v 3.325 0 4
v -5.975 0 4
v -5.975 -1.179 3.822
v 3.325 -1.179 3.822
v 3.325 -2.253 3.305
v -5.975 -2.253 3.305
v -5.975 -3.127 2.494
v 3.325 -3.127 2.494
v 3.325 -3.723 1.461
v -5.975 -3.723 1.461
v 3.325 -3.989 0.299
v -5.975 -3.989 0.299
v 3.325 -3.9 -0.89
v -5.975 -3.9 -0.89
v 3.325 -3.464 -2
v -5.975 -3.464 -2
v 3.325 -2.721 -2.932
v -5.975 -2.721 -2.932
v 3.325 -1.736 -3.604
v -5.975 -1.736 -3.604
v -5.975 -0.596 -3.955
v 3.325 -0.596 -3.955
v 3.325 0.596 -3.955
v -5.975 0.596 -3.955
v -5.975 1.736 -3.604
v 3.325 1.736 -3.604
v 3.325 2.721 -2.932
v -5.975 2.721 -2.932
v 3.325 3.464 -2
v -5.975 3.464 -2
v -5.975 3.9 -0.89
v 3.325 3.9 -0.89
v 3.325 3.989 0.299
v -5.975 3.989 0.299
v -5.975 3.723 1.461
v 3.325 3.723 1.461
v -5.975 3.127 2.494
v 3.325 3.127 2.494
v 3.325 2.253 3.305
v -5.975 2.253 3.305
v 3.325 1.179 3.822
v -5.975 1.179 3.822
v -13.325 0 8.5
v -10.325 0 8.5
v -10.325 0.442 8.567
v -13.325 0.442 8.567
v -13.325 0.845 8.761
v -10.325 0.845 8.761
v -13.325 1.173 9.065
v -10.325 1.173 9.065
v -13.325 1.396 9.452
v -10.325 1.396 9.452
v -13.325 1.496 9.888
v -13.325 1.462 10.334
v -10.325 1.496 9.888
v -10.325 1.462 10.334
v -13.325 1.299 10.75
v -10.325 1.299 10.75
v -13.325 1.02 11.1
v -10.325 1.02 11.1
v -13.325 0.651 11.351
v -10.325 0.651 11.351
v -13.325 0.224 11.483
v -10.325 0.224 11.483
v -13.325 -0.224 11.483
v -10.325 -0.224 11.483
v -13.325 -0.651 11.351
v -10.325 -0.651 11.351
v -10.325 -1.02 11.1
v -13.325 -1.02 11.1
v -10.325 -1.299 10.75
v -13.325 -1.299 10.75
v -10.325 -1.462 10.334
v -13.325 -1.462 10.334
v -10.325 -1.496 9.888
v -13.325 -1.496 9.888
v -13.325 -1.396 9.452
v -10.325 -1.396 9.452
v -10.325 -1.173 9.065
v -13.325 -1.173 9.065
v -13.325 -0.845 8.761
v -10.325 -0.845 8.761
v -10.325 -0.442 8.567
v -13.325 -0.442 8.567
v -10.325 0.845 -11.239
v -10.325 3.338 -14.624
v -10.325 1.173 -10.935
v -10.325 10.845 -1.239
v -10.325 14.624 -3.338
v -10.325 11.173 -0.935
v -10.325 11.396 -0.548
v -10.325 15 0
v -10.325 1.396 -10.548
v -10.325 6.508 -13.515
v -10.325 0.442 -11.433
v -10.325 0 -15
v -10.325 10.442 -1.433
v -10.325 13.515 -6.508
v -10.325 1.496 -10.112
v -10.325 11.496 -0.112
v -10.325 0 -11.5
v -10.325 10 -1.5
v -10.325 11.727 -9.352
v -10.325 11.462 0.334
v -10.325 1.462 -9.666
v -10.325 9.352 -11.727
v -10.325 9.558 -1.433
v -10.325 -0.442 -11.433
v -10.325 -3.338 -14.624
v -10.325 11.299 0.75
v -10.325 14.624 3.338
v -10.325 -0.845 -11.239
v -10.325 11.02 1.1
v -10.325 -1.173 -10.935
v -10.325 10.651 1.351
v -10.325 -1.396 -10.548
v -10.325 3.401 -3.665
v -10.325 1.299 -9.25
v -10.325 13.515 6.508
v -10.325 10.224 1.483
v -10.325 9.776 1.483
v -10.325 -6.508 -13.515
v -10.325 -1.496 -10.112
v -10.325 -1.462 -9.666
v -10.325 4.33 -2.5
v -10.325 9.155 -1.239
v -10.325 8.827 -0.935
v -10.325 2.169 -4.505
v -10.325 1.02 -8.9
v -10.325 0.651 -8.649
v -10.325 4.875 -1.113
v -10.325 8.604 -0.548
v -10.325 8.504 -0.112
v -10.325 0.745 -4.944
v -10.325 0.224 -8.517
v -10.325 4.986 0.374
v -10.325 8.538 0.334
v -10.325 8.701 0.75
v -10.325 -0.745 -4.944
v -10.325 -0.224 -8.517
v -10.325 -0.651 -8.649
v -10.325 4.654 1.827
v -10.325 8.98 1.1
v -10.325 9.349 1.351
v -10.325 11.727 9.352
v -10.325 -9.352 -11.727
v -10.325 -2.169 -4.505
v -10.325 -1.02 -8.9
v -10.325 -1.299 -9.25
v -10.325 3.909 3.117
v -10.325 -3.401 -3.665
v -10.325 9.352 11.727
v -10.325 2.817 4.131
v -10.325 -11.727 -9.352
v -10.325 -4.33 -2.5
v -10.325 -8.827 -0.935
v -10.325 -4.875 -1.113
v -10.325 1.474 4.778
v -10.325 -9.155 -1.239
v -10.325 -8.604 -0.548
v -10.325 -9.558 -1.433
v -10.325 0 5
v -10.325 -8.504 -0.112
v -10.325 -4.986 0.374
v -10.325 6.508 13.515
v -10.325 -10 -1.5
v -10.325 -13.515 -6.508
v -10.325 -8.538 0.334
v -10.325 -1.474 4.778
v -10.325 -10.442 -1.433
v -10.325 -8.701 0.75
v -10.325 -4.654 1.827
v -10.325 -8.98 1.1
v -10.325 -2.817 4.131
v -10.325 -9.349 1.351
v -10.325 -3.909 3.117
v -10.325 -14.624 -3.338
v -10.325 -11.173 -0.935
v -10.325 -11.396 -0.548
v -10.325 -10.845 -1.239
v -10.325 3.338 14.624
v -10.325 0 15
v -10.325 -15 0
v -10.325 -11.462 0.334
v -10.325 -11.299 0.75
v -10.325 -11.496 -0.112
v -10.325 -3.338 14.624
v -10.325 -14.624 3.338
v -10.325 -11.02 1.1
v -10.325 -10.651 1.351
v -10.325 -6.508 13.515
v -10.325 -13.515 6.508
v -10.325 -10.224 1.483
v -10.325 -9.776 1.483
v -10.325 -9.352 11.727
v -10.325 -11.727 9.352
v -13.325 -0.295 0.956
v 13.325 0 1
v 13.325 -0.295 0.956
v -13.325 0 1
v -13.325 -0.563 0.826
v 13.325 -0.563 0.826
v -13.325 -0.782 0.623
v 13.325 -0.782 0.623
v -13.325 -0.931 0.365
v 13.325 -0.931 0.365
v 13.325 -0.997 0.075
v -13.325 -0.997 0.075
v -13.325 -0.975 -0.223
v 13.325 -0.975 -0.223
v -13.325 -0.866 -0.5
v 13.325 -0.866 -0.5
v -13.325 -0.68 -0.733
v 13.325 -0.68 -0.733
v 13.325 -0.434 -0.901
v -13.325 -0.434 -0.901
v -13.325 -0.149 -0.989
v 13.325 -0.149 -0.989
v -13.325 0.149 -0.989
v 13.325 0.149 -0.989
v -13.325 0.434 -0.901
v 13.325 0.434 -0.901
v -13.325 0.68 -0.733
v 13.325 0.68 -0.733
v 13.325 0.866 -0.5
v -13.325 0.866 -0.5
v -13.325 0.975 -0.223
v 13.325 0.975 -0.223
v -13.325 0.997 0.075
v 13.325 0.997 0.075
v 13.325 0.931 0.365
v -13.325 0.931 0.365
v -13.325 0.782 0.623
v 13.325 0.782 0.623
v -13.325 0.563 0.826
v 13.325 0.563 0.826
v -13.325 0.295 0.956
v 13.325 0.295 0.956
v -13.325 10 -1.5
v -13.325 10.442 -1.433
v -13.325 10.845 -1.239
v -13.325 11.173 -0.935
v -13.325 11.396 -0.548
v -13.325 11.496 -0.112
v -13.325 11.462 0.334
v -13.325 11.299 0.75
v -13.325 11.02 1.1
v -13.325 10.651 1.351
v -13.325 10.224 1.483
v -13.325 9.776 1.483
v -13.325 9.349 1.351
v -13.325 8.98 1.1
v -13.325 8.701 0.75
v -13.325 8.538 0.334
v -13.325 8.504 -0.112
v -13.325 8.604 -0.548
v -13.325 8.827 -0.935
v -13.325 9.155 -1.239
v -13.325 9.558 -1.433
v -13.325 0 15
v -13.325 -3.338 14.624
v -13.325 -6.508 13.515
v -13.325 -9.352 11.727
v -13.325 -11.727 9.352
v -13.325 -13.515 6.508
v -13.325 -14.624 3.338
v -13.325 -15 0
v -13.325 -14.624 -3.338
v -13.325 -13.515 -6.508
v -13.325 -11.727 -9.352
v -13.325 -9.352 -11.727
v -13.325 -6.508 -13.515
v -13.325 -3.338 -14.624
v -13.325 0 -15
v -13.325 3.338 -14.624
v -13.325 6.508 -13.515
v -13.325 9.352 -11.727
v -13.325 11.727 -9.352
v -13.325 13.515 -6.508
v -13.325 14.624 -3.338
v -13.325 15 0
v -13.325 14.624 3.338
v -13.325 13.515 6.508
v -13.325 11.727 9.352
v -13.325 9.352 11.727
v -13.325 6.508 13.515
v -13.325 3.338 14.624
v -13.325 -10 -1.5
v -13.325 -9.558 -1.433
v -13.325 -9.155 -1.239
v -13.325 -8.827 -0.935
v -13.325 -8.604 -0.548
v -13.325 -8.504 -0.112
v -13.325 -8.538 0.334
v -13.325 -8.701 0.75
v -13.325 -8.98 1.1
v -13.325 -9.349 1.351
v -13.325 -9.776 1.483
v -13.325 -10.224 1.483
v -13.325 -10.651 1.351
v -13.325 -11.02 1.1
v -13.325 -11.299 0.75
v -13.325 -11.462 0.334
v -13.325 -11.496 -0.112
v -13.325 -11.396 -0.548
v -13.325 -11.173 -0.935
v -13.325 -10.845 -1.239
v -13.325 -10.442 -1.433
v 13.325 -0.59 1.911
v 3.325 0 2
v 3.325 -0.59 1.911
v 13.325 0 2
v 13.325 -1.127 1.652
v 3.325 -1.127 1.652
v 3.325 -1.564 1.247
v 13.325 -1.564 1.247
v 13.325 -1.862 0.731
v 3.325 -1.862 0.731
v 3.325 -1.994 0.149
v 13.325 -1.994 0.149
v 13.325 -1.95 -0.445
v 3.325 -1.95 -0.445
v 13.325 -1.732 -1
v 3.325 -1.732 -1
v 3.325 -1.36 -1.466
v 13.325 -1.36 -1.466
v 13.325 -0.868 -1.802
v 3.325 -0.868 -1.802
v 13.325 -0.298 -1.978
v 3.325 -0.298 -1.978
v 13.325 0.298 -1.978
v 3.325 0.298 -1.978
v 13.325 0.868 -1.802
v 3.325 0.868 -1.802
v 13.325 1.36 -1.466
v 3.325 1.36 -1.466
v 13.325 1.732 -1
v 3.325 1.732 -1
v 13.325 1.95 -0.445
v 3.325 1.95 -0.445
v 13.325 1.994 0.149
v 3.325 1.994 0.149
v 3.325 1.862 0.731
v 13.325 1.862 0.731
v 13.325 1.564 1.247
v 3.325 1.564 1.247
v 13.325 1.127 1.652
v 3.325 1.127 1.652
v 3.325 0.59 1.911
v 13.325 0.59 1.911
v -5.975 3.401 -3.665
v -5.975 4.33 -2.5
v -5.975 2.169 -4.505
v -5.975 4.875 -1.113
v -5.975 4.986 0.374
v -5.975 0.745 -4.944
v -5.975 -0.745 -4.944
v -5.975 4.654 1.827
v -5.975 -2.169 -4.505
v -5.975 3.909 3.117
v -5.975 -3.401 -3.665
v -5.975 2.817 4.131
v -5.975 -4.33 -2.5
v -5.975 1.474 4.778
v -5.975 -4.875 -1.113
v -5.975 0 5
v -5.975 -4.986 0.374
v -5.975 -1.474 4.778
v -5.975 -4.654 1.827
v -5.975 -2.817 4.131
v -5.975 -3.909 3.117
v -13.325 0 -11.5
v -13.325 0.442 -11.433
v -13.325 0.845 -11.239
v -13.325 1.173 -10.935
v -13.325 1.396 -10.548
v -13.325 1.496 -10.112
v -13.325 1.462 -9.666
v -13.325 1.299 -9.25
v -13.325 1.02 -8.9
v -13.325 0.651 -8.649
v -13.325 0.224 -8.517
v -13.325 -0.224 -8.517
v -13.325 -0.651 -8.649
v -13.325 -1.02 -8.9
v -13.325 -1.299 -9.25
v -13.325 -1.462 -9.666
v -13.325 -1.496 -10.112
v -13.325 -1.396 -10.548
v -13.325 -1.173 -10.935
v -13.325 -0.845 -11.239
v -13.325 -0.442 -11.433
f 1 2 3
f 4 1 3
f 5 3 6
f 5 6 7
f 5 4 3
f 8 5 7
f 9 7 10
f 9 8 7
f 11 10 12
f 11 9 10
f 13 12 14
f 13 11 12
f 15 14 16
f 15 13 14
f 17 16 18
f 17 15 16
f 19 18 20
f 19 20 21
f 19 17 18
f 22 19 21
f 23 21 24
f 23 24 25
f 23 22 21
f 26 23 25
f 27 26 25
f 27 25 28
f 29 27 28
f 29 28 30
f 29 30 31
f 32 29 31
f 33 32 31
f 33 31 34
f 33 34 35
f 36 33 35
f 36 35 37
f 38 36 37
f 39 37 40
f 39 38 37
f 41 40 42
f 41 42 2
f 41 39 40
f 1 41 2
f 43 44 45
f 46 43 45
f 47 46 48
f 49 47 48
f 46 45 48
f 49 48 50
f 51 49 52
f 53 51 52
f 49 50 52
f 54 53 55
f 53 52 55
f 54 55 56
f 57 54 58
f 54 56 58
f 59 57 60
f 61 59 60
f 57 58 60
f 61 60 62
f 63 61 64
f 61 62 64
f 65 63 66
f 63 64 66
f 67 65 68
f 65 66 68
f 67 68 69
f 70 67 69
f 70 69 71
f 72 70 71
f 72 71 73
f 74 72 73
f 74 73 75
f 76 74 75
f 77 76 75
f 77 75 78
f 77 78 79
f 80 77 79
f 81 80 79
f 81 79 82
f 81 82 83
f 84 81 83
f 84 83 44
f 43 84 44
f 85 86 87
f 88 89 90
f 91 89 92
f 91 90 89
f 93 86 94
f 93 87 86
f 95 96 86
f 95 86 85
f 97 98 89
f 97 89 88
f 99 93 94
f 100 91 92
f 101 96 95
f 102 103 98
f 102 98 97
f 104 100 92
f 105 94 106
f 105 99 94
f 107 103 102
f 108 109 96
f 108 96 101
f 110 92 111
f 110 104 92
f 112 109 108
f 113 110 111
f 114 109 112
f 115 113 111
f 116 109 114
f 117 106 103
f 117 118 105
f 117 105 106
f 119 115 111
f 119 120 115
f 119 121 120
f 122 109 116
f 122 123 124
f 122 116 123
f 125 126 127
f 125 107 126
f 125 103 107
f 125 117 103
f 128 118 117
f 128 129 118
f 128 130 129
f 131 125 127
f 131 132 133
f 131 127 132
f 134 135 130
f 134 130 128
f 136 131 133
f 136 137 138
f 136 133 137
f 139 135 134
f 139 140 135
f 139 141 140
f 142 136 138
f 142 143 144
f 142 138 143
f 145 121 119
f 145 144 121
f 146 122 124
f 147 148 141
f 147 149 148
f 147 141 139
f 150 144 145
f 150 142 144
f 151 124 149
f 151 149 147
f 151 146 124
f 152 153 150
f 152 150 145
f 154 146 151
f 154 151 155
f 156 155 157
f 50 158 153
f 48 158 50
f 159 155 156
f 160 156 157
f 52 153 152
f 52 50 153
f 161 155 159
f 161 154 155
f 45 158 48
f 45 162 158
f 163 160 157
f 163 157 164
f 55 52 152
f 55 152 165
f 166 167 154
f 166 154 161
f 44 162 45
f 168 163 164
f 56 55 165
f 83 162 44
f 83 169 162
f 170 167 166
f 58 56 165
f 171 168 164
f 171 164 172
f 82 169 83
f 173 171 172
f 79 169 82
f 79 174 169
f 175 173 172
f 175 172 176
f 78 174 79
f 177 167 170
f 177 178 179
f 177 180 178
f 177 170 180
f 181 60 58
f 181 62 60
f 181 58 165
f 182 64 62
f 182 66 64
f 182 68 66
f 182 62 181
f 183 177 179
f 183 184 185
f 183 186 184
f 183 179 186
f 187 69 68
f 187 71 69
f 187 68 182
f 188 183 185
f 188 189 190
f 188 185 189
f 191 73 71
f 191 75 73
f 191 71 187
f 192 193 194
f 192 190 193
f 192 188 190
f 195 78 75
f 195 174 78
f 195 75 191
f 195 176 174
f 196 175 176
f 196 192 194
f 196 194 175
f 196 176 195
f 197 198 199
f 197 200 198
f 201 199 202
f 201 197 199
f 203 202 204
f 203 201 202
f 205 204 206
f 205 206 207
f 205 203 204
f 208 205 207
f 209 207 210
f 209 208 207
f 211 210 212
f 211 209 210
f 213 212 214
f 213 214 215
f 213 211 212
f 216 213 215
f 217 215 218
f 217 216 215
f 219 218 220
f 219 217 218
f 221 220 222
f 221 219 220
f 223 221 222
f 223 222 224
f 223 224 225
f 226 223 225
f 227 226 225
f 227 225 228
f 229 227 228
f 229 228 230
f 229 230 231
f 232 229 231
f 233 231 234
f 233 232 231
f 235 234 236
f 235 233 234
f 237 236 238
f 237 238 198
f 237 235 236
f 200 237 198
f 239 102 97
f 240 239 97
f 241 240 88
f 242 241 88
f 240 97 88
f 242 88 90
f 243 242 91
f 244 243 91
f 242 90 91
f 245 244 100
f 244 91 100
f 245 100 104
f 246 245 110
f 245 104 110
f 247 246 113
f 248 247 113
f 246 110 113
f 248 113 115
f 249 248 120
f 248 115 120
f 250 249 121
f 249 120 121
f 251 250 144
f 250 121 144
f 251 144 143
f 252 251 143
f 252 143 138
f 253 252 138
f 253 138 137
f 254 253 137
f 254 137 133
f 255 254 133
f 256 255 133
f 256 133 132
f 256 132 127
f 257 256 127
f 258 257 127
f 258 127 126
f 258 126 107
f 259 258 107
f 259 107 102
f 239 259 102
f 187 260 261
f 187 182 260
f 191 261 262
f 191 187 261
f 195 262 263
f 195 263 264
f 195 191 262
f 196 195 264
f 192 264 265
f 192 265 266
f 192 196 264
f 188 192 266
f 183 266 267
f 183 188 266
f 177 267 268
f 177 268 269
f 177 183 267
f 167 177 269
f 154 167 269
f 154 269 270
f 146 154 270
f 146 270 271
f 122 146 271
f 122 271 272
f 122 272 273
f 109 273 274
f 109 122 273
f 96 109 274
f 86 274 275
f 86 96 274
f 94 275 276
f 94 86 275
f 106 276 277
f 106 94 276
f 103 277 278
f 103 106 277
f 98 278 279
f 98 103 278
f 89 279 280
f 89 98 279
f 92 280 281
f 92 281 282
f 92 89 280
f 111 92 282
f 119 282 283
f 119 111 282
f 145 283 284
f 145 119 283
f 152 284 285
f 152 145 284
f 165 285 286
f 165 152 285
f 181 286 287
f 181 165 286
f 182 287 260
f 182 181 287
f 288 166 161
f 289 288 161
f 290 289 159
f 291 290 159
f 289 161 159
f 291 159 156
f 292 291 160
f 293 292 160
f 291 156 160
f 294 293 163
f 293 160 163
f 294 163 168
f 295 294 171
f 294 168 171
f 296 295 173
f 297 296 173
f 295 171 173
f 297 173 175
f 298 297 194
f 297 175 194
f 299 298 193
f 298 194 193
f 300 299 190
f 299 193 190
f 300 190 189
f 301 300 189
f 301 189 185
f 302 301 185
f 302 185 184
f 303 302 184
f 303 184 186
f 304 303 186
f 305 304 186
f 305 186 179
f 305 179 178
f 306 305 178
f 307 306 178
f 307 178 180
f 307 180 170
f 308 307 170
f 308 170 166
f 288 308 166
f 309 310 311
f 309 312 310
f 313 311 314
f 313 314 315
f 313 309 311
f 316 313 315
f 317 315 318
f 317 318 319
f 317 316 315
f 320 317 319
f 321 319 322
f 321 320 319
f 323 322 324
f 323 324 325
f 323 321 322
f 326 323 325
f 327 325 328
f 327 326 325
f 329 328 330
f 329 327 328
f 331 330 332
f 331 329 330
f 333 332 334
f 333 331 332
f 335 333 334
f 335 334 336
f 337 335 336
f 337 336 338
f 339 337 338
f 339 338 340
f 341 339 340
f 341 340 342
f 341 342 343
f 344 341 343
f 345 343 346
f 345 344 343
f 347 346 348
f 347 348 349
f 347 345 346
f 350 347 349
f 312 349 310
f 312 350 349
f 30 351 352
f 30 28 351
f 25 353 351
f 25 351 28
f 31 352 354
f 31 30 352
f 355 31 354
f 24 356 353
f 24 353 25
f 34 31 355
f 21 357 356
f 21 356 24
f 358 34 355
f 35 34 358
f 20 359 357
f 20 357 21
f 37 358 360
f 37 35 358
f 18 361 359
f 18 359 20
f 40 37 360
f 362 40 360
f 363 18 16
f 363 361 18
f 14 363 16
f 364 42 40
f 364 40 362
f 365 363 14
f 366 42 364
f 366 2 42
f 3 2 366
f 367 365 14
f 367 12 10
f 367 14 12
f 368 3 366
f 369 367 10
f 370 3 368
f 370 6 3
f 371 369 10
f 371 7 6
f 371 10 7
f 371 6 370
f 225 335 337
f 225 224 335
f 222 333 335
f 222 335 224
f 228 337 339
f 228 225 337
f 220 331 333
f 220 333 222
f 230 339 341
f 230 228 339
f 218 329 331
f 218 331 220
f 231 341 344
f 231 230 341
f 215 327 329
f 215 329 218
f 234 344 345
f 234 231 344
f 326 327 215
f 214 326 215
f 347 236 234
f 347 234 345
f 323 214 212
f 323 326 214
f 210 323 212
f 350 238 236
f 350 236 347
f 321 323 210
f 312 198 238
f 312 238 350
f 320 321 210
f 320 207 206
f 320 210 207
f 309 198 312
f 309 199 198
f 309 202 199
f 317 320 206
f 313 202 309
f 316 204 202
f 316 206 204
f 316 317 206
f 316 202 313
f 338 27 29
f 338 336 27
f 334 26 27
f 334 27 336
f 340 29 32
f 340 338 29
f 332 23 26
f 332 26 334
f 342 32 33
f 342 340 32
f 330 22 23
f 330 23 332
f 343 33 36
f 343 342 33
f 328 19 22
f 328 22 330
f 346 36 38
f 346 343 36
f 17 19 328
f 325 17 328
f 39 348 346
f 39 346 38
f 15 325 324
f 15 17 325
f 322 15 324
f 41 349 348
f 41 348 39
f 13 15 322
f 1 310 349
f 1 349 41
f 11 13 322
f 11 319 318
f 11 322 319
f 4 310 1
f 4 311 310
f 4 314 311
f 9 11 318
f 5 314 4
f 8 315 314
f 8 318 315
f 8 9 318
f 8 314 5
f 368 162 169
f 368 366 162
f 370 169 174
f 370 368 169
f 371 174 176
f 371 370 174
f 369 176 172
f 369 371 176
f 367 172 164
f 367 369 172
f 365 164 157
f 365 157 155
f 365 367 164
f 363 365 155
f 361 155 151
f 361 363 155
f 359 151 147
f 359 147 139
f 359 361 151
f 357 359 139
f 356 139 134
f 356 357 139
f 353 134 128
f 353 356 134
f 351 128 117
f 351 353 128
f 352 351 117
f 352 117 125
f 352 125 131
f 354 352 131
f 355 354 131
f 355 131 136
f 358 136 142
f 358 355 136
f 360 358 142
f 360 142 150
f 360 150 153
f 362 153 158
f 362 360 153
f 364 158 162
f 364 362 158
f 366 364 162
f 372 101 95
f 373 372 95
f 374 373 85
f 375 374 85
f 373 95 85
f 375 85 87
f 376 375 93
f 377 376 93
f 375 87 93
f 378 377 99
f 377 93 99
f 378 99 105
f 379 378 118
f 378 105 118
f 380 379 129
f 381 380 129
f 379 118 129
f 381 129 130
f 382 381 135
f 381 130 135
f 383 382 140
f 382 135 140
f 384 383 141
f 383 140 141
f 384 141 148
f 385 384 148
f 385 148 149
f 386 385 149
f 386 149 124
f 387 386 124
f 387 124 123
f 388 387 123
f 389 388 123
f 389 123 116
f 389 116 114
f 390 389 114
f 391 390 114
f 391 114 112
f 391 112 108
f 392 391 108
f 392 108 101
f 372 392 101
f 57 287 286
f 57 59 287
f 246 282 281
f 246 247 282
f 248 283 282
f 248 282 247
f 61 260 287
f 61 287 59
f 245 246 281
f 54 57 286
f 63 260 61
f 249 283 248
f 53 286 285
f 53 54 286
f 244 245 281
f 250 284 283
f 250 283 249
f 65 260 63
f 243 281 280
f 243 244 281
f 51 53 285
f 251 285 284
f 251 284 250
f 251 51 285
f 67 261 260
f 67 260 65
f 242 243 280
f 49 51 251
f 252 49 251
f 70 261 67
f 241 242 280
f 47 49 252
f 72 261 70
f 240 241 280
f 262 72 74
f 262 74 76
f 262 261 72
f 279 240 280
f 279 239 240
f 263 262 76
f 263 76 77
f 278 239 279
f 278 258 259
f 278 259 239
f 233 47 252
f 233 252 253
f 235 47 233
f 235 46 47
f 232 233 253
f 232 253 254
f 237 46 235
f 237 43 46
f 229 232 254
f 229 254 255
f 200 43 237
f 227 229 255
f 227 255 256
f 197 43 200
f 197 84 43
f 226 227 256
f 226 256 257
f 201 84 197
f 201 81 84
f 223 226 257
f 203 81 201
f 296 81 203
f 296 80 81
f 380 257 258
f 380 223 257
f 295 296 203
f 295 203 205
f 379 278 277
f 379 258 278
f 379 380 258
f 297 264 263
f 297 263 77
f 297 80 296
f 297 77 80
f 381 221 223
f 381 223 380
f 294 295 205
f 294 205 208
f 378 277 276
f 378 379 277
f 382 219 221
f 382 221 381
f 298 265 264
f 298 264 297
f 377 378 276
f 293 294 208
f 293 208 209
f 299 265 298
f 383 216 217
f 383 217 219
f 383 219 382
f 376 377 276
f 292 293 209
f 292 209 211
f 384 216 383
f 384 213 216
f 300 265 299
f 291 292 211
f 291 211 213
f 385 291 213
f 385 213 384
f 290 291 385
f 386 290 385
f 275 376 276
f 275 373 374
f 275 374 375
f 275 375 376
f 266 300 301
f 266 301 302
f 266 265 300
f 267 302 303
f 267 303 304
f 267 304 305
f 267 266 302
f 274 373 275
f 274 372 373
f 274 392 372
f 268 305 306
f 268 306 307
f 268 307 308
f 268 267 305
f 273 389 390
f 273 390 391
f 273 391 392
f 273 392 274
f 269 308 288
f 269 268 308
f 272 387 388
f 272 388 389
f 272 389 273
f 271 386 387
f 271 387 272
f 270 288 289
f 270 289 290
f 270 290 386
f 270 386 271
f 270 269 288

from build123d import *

# Parameters (mm, degrees)
SKETCH2_R          = 1.5
CUT_EXTRUDE1_DEPTH = 32.769836323


with BuildPart() as part:
    # Sketch1 → Revolve1 (revolve)
    with BuildSketch(Plane.XY, mode=Mode.PRIVATE) as revolve1_sk:
        Polygon((-13.325, 1), (-13.325, 15), (-10.325, 15), (-10.325, 5), (-5.975, 5), (-5.975, 4), (3.325, 4), (3.325, 2), (13.325, 2), (13.325, 1), align=None)
    revolve(revolve1_sk.sketch.rotate(Axis((-13.325, 0, 0), (1, 0, 0)), 90), axis=Axis((-13.325, 0, 0), (1, 0, 0)))

    # Sketch2 → Cut-Extrude1 (cut, through all)
    with BuildSketch(Plane(origin=(-10.325, 0, 0), x_dir=(0, 0, -1), z_dir=(1, 0, 0))):
        with Locations((0, 10)):
            Circle(SKETCH2_R)
        with Locations((10, 0)):
            Circle(SKETCH2_R)
        with Locations((0, -10)):
            Circle(SKETCH2_R)
        with Locations((-10, 0)):
            Circle(SKETCH2_R)
    extrude(amount=-CUT_EXTRUDE1_DEPTH, mode=Mode.SUBTRACT)


solid = part.part
